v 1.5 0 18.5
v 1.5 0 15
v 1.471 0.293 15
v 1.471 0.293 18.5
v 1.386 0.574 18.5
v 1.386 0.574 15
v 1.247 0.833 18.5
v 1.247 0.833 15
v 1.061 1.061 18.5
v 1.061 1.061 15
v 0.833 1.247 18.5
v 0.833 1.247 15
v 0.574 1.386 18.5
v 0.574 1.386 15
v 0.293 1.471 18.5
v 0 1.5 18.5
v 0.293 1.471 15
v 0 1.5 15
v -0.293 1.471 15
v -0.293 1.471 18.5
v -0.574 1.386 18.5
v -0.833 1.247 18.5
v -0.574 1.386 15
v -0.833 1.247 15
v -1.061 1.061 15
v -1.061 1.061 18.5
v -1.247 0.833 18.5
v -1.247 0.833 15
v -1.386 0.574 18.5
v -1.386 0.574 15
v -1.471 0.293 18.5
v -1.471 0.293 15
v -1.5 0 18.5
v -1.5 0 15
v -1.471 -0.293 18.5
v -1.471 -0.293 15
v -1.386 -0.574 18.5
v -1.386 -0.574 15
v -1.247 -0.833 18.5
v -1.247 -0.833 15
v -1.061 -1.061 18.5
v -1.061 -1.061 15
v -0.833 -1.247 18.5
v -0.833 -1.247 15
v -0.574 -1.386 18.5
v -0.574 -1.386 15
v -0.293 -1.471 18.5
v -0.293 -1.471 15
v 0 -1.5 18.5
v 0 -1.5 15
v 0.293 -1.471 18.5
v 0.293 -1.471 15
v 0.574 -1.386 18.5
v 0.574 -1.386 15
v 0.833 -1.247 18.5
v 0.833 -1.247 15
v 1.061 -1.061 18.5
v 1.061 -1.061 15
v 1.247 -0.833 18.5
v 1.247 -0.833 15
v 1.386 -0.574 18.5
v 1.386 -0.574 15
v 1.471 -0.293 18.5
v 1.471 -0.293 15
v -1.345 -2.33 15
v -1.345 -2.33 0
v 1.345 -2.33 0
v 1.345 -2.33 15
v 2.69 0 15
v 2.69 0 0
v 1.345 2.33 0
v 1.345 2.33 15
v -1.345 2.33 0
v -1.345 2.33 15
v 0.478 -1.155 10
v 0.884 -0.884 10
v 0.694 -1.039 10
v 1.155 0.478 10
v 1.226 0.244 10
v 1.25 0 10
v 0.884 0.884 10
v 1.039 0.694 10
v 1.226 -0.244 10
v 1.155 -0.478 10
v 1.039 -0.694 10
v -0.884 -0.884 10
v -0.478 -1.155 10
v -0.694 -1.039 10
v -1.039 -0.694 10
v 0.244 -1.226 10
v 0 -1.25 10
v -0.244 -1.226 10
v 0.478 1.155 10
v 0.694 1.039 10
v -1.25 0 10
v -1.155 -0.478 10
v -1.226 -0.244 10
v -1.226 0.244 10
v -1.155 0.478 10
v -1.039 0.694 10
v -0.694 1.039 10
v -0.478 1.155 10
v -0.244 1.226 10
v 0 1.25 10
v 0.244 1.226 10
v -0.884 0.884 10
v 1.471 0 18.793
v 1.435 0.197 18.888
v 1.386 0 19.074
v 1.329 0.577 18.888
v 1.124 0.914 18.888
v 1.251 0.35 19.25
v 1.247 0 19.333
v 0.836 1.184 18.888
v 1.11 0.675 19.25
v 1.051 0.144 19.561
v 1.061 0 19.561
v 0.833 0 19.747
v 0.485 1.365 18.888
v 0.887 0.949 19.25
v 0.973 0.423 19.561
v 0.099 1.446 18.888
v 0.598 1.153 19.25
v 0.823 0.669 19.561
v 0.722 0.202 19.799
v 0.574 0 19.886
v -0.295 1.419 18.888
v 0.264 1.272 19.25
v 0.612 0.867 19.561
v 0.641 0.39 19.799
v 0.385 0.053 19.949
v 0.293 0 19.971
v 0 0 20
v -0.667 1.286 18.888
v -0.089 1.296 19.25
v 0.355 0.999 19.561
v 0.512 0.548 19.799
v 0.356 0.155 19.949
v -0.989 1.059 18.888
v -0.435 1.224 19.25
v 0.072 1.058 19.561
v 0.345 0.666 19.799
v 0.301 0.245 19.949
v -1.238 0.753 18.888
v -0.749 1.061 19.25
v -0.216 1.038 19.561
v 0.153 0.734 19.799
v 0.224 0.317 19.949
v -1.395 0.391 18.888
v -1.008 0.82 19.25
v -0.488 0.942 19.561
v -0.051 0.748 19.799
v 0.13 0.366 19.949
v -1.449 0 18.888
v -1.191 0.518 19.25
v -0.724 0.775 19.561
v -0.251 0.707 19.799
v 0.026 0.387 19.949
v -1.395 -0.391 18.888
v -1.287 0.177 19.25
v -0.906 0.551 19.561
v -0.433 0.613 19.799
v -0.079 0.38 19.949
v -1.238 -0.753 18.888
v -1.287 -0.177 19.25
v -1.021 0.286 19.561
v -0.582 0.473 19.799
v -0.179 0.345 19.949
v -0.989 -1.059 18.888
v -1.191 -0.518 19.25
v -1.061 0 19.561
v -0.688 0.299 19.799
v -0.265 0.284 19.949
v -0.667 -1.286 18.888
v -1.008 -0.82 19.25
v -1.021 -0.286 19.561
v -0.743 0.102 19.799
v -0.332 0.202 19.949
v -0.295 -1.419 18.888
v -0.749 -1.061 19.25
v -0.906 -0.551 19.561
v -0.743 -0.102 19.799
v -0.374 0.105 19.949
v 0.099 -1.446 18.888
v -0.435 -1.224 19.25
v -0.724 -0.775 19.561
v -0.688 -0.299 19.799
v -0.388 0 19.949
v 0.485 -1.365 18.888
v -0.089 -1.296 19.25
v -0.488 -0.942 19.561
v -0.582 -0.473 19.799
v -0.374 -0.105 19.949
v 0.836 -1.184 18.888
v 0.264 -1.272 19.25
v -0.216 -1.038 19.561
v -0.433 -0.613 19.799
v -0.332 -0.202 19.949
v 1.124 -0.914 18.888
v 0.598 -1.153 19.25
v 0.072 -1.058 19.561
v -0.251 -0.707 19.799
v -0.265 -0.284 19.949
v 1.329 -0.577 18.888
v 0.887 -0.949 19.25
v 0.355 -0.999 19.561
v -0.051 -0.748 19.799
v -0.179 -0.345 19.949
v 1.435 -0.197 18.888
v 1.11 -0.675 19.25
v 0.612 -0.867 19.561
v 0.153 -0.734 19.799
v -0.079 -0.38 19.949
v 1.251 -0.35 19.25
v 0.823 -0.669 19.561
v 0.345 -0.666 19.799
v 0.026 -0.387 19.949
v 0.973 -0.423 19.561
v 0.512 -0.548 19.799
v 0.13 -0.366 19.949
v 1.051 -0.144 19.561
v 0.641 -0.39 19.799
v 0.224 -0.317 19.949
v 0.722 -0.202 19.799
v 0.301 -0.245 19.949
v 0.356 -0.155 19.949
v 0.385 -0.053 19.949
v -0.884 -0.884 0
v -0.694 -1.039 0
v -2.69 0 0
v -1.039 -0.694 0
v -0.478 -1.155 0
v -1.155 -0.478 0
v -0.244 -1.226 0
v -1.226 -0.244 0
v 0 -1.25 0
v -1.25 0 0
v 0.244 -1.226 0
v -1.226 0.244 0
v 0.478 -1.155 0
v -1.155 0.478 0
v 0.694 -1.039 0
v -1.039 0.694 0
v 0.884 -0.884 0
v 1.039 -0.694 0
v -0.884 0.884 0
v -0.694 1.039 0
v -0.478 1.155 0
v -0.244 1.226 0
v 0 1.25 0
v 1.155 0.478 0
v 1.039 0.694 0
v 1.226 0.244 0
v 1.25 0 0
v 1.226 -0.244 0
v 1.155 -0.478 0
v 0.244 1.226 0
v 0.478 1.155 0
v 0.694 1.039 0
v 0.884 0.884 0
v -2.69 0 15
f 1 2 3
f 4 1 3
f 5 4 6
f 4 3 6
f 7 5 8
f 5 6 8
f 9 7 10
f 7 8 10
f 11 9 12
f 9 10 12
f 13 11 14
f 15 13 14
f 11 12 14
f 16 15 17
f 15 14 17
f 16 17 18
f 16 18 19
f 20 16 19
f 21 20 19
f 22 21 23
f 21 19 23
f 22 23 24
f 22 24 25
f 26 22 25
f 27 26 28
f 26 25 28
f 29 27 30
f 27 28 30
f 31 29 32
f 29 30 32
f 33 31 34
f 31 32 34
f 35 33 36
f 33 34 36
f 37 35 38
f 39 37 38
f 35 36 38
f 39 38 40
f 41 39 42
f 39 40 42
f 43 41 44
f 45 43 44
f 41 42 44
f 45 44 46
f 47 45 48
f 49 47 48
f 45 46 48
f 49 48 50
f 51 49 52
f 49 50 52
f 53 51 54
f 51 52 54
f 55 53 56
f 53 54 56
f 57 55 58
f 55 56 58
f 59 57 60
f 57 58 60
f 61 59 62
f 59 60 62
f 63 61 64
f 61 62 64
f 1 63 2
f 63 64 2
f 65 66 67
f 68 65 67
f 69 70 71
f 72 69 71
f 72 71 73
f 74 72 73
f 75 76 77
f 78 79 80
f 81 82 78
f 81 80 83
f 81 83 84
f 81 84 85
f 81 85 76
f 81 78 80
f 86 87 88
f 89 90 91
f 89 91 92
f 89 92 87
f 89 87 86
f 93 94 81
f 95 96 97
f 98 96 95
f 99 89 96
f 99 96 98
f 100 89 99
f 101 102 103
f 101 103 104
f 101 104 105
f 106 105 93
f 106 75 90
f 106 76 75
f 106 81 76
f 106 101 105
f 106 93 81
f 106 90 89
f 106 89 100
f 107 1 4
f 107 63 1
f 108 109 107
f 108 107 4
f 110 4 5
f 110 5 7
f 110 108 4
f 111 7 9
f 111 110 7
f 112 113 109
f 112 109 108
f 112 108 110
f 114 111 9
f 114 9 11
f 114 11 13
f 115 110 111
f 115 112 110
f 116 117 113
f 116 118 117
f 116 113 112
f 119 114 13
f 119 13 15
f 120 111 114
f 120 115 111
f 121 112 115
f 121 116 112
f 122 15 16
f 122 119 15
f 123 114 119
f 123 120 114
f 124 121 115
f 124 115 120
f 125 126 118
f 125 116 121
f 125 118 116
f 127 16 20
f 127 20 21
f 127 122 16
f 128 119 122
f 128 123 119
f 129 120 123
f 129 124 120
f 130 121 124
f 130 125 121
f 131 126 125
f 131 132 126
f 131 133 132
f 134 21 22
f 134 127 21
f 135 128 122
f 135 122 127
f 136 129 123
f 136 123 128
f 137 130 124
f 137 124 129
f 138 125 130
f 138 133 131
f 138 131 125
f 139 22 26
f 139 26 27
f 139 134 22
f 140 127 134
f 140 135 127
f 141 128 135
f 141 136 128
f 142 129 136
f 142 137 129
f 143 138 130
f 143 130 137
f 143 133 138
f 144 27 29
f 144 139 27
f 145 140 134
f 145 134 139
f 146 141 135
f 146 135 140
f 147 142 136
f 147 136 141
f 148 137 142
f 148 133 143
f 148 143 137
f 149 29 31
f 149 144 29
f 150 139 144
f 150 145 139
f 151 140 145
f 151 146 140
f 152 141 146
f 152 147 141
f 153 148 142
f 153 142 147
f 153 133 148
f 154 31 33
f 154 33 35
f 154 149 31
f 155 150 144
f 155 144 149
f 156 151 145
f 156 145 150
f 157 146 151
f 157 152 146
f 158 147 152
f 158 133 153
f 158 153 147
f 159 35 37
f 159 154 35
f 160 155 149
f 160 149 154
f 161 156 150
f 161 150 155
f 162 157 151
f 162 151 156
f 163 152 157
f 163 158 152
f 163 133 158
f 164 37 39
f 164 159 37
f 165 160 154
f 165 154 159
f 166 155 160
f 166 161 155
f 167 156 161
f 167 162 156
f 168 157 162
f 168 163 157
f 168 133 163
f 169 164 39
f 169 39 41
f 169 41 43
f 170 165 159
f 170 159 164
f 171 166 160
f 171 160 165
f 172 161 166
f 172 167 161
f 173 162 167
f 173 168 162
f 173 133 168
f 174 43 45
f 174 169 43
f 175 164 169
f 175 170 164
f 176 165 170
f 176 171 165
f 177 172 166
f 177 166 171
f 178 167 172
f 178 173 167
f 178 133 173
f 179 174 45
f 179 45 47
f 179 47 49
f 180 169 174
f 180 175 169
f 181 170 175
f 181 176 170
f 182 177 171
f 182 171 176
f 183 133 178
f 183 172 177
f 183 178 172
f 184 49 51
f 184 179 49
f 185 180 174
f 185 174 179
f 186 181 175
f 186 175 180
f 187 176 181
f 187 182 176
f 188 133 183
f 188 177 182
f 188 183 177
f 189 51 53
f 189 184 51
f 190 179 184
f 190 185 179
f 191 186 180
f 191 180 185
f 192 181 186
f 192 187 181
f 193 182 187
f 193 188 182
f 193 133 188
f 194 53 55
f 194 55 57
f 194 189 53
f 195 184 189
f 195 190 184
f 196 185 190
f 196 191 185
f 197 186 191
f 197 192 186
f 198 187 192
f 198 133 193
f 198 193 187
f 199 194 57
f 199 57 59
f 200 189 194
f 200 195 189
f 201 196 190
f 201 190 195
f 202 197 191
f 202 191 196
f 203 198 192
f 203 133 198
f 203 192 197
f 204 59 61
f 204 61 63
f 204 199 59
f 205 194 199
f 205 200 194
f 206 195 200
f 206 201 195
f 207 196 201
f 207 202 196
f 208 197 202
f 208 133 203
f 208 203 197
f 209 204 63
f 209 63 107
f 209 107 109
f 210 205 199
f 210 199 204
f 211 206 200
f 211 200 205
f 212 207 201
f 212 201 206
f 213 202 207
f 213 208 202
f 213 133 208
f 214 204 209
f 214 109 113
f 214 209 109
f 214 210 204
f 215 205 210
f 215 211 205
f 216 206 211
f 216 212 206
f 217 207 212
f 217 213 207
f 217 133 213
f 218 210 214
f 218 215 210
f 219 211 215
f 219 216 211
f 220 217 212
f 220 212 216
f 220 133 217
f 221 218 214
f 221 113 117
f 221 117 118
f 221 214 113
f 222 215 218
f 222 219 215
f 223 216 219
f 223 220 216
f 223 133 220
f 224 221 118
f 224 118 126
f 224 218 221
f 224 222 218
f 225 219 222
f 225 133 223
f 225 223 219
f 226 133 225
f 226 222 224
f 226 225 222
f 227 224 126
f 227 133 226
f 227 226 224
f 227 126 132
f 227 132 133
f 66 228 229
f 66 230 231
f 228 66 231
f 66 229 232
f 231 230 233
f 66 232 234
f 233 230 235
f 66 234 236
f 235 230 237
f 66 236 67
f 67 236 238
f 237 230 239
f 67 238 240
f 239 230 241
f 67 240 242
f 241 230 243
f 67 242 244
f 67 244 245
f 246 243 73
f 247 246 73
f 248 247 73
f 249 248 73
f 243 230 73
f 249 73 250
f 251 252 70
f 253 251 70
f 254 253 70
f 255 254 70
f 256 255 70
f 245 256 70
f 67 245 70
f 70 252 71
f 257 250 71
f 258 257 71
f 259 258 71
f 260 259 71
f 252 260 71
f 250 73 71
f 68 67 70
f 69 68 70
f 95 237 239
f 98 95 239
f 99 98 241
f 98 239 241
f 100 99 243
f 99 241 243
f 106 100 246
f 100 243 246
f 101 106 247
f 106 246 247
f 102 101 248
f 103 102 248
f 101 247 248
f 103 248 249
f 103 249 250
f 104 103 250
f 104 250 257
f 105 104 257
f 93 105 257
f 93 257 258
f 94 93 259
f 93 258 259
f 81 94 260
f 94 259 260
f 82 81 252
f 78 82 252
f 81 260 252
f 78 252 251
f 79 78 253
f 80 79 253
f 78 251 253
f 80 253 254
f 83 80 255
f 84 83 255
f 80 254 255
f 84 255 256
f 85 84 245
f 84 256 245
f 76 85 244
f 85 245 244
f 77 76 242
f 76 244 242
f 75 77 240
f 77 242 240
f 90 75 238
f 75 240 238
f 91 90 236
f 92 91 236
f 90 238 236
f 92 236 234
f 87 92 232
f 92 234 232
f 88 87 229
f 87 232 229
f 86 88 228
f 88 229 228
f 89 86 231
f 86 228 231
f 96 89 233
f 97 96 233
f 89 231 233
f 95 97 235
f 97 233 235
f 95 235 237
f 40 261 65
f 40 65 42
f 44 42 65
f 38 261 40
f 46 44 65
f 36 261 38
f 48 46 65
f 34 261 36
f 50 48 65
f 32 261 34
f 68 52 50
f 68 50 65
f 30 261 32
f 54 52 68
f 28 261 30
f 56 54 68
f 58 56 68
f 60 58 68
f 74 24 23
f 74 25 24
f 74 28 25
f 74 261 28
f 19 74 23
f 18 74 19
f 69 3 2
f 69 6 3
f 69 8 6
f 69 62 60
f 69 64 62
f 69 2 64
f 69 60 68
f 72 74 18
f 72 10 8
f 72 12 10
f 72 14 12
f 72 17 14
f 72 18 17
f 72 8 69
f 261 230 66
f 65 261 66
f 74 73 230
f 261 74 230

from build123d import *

# Parameters (mm, degrees)
EXTRUDE_1_DEPTH     = 15
SKETCH_2_R          = 1.5
EXTRUDE_2_DEPTH     = 5
FILLET_1_R          = 1.5
SKETCH_3_R          = 1.25
CUT_EXTRUDE_1_DEPTH = 10


with BuildPart() as part:
    # 草图1 → 凸台-拉伸1 (new body)
    with BuildSketch(Plane.XY):
        Polygon((2.690452254, 0), (1.345226127, 2.33), (-1.345226127, 2.33), (-2.690452254, 0), (-1.345226127, -2.33), (1.345226127, -2.33), align=None)
    extrude(amount=EXTRUDE_1_DEPTH)

    # 草图2 → 凸台-拉伸2 (add)
    with BuildSketch(Plane.XY.offset(15)):
        Circle(SKETCH_2_R)
    extrude(amount=EXTRUDE_2_DEPTH)

    # 圆角1
    fillet_1_edges = [part.edges().sort_by_distance(p)[0] for p in [
        (-1.5, 0, 20),
    ]]
    fillet(fillet_1_edges, radius=FILLET_1_R)

    # 草图3 → 切除-拉伸1 (cut)
    with BuildSketch(Plane(origin=(0, 0, 0), x_dir=(-1, 0, 0), z_dir=(0, 0, -1))):
        Circle(SKETCH_3_R)
    extrude(amount=-CUT_EXTRUDE_1_DEPTH, mode=Mode.SUBTRACT)


solid = part.part
